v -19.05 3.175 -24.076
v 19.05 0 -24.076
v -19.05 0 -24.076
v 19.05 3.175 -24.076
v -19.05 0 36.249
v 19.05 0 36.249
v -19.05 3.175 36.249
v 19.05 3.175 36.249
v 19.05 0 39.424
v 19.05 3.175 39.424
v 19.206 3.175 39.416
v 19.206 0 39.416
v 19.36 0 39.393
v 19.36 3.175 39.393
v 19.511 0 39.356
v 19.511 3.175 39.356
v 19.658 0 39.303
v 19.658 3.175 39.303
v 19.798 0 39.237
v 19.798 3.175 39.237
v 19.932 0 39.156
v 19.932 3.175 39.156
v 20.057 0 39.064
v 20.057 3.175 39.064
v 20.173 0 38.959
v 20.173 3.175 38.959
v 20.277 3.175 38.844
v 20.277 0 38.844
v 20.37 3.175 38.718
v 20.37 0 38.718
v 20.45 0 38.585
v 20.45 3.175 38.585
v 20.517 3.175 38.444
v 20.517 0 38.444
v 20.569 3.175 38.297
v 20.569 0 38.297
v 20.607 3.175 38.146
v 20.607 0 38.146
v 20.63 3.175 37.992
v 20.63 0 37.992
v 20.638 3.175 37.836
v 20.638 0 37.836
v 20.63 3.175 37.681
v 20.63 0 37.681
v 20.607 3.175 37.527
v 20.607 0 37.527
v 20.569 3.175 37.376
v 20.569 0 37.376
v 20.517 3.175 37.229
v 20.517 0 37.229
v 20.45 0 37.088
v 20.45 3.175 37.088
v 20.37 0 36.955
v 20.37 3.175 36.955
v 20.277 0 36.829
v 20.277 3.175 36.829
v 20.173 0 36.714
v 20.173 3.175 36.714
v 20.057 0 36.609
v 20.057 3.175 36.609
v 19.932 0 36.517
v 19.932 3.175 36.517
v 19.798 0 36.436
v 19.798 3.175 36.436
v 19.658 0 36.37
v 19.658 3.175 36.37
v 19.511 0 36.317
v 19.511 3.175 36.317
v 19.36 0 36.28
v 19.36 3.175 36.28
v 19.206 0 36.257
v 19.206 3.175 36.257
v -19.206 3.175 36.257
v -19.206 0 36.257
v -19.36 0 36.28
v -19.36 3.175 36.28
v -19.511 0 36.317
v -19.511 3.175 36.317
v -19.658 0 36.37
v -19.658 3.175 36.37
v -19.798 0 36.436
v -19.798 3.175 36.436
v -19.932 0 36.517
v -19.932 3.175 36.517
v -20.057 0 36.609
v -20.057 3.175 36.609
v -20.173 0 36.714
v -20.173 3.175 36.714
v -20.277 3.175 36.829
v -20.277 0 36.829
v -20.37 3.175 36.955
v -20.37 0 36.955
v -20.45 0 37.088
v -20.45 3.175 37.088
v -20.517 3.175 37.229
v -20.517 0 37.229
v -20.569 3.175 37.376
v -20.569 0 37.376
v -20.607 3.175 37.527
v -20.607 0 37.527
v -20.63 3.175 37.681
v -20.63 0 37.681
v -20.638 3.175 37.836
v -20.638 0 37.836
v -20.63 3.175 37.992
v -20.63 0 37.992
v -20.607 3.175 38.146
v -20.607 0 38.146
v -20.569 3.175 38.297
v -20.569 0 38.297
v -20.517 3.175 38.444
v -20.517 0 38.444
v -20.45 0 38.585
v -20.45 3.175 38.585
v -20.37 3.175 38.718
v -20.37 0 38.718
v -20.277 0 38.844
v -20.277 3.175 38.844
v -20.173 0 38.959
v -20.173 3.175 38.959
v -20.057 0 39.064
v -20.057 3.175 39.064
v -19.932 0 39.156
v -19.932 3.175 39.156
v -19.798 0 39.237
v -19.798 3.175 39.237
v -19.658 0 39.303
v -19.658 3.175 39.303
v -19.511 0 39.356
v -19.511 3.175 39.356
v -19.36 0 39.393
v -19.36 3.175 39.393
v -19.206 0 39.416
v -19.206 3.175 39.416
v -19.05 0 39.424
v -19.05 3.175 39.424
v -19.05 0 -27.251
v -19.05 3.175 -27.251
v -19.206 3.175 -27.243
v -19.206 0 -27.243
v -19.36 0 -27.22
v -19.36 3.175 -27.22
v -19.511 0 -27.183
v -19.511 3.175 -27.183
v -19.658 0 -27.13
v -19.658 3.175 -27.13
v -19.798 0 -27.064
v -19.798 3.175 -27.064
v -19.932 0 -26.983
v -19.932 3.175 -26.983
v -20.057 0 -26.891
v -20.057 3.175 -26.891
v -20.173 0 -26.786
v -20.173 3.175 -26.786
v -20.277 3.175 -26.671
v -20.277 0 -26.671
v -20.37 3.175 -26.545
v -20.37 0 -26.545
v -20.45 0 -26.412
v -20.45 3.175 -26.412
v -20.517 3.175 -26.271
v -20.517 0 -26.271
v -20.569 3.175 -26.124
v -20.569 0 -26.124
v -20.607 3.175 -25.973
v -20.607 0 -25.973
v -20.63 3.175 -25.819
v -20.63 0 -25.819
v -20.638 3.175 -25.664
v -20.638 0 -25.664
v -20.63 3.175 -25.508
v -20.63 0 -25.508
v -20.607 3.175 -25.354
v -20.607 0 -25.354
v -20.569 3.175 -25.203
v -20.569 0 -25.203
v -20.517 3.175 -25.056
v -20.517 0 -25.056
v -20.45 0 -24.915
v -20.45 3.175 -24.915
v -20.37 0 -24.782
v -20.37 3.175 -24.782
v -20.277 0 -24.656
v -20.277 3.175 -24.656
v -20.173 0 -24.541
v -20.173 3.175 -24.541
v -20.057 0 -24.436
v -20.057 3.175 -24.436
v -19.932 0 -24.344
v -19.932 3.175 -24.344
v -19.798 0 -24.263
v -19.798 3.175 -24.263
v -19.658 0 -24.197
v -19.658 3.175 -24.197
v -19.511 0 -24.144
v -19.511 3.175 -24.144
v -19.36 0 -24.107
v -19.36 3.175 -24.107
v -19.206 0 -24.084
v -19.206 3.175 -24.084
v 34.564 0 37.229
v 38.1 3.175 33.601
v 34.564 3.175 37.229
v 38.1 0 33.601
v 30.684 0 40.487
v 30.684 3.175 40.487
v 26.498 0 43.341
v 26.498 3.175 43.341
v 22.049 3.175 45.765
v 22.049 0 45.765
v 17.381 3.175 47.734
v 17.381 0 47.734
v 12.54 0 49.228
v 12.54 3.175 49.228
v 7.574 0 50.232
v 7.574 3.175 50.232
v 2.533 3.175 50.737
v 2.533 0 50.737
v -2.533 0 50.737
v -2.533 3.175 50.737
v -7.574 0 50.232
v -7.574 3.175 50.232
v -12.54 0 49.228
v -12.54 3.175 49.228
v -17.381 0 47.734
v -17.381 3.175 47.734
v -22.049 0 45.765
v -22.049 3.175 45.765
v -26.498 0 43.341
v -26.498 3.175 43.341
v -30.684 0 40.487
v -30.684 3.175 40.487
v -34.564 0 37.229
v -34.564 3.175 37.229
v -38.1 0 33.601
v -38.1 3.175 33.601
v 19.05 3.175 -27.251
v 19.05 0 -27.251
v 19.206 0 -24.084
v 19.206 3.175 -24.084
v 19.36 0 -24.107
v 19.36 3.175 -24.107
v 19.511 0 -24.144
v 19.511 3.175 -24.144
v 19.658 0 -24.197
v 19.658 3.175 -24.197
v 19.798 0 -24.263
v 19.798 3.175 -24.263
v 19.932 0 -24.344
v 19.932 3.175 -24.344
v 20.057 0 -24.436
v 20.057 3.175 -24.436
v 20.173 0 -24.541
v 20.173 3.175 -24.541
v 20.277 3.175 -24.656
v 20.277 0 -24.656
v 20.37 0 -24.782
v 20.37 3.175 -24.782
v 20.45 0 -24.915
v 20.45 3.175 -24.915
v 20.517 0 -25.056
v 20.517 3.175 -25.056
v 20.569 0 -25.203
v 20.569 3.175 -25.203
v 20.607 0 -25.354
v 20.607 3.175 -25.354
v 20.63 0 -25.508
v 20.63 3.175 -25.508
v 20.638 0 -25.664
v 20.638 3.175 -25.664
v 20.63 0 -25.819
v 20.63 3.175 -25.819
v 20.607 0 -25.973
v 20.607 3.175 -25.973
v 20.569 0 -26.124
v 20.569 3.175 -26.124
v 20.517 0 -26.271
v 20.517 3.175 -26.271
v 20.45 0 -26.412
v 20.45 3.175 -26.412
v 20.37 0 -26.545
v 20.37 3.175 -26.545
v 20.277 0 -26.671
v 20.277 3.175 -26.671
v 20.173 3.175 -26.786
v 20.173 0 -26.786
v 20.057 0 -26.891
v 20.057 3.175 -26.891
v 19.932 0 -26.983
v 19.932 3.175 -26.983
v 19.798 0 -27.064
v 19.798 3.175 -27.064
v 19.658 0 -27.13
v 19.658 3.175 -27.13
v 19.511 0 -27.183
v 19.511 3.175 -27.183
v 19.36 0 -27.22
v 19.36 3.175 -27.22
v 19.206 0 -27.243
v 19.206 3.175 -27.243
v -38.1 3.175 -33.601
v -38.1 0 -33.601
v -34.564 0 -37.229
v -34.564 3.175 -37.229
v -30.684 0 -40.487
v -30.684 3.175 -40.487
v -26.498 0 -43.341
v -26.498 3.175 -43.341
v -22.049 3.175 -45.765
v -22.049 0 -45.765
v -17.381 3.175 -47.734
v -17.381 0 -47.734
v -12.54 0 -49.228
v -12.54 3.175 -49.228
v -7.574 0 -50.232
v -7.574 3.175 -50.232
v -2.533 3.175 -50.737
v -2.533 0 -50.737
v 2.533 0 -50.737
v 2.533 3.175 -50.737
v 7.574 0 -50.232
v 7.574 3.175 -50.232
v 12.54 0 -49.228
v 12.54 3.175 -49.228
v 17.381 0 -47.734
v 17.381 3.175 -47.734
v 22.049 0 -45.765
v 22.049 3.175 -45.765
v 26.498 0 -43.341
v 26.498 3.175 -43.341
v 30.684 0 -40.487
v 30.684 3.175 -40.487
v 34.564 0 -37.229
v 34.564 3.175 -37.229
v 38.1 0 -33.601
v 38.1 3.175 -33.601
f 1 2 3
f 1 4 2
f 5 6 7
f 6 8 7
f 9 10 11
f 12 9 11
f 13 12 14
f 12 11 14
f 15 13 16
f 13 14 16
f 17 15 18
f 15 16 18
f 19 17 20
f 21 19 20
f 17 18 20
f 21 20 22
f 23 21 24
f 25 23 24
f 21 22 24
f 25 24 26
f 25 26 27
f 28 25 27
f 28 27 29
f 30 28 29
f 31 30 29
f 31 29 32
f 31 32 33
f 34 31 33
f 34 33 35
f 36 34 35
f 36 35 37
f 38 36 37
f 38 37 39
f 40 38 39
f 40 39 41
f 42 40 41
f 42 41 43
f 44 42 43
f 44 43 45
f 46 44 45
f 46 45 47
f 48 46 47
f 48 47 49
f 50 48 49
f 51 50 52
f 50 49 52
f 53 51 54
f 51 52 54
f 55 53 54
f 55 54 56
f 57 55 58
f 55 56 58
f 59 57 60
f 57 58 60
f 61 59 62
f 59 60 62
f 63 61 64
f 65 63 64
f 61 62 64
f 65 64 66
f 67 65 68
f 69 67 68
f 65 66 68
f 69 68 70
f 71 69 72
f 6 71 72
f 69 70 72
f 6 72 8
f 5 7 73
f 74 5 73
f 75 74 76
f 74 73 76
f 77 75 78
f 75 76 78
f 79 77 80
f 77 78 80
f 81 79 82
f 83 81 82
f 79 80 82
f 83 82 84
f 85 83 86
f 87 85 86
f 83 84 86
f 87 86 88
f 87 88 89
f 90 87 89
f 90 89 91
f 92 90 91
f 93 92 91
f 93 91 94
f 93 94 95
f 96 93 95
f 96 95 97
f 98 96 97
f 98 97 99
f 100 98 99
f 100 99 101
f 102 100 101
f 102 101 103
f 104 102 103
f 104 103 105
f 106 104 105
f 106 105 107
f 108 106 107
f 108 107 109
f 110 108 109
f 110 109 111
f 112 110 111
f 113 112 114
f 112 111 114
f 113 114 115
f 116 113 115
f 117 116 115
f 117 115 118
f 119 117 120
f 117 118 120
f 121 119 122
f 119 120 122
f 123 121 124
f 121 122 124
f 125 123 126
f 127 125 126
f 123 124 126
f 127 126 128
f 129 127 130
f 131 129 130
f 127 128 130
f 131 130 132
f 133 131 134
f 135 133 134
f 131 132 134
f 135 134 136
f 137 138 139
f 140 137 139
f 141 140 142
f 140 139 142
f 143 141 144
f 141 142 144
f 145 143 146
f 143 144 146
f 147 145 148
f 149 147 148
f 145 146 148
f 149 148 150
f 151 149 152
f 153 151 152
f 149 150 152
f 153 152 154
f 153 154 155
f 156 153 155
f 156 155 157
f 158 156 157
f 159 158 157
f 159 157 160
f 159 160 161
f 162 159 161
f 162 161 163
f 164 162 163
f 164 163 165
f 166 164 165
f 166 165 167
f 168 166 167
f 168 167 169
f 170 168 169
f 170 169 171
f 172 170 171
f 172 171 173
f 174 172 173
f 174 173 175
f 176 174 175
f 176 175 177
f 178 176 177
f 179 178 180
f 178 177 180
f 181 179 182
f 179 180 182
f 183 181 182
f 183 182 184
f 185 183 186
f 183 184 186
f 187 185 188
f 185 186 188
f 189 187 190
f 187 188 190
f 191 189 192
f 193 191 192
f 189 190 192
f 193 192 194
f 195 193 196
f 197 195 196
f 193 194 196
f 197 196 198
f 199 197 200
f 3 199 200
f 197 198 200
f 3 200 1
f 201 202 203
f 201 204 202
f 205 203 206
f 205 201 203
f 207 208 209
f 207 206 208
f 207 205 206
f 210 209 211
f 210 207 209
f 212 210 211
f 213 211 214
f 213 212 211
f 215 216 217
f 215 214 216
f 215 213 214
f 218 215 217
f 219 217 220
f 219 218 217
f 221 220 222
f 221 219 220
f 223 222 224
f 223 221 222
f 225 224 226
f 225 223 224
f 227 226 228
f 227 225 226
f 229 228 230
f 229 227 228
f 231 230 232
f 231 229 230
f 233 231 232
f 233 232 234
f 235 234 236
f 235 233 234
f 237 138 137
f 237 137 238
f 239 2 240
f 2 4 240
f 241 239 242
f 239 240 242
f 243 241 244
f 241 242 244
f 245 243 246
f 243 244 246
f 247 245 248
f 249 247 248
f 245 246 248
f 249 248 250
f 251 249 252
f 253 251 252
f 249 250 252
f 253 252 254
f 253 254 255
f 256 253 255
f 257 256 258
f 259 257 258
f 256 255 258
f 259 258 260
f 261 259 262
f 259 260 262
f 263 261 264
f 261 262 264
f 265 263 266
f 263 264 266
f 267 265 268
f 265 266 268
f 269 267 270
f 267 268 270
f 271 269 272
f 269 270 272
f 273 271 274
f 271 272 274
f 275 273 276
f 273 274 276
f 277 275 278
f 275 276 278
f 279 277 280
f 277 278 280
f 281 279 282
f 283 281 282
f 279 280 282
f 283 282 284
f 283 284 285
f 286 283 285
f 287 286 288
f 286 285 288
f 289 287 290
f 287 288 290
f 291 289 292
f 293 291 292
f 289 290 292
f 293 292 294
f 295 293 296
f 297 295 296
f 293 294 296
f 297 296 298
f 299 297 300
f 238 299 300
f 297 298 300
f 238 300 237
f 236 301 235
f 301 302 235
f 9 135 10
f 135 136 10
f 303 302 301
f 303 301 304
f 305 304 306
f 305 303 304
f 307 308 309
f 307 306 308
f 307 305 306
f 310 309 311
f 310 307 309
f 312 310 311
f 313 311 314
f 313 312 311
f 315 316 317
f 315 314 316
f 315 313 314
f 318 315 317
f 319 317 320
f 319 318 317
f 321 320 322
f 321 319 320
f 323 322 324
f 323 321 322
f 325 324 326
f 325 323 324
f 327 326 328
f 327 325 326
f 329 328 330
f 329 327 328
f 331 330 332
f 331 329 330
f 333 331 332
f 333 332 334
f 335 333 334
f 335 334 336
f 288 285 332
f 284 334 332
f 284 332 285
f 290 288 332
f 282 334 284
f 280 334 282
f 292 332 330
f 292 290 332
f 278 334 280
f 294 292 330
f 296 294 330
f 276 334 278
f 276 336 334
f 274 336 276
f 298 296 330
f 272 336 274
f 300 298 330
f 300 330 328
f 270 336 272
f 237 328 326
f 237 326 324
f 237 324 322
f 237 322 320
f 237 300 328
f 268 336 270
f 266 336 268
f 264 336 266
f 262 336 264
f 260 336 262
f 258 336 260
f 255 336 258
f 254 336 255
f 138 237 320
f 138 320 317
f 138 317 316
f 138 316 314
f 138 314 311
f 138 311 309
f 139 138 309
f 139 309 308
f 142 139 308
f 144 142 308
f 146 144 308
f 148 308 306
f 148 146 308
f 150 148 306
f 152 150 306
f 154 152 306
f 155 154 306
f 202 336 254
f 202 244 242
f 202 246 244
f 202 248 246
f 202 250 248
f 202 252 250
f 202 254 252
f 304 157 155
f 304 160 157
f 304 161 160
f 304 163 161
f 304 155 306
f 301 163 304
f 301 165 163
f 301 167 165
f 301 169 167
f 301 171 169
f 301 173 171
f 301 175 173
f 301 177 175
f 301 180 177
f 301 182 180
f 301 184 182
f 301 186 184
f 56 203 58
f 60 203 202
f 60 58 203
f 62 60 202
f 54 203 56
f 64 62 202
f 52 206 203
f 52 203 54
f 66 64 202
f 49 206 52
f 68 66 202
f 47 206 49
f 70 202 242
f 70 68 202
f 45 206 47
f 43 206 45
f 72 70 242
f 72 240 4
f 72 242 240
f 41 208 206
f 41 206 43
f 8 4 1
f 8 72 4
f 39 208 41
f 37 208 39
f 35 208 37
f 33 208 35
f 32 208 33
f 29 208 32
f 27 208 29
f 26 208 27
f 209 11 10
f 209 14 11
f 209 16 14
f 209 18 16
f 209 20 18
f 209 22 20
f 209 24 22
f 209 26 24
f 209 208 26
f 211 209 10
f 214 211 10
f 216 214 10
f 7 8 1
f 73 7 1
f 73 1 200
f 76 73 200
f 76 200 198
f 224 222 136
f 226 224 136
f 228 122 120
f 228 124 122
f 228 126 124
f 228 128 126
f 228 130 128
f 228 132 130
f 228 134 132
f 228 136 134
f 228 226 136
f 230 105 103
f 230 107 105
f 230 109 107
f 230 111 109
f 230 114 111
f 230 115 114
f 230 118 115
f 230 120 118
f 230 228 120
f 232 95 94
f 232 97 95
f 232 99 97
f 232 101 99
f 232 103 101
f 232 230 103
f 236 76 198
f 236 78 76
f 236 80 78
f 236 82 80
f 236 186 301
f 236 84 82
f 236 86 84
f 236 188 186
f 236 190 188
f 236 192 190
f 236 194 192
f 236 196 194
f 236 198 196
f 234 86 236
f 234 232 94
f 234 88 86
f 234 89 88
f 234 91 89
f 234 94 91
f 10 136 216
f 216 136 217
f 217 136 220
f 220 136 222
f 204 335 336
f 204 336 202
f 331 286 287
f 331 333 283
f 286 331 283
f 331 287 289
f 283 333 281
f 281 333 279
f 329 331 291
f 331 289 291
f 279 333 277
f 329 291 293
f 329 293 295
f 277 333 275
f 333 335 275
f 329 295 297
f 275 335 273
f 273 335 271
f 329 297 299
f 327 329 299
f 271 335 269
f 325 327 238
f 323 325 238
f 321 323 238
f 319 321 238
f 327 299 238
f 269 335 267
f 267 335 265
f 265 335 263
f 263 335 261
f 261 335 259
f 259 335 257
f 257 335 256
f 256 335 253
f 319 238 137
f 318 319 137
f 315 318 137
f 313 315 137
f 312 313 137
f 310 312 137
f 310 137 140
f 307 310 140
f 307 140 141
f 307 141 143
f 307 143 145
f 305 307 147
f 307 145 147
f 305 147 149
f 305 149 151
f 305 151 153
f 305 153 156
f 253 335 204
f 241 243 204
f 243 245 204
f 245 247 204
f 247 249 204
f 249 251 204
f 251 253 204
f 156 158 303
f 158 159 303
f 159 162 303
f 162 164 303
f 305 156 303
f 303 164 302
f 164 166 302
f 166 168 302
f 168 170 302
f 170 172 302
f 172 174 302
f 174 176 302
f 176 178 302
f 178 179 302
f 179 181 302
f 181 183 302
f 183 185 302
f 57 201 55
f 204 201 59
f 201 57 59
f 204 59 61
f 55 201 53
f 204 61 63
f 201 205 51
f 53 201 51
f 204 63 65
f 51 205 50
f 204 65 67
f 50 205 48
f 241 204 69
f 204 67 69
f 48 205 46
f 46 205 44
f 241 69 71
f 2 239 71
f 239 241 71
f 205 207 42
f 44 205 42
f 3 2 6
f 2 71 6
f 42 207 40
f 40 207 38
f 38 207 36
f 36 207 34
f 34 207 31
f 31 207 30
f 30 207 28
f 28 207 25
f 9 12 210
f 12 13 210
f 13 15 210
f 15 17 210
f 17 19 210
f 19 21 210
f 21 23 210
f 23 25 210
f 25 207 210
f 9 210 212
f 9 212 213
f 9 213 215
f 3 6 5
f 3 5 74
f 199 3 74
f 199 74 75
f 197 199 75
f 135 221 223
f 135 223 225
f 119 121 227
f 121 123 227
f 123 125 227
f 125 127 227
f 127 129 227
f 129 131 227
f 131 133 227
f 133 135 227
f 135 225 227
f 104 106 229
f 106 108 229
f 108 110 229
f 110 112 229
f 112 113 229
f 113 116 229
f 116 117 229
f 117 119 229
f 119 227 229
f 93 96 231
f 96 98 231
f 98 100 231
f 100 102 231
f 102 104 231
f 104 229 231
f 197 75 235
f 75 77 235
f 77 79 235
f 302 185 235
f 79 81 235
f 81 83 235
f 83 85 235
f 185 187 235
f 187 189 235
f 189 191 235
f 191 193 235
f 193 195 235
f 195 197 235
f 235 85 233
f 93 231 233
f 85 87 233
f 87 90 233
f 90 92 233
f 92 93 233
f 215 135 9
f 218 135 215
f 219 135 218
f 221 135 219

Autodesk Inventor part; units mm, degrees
ref_plane "YZ Plane" through (0, 0, 0) normal (1, 0, 0) x (0, 1, 0)
ref_plane "XZ Plane" through (0, 0, 0) normal (0, 1, 0) x (-1, 0, 0)
ref_plane "XY Plane" through (0, 0, 0) normal (0, 0, 1) x (1, 0, 0)
sketch "Sketch1" plane through (0, 0, 0) normal (0, 1, 0) x (-1, 0, 0)
  arc A0 (38.1, 33.601) -> (-38.1, 33.601) centre (0, 0) ccw
  line L0 (38.1, -33.601) -> (38.1, 33.601)
  arc A1 (38.1, -33.601) -> (38.1, 33.601) centre (0, 0) ccw construction
  line L1 (-38.1, -33.601) -> (-38.1, 33.601)
  arc A2 (-38.1, -33.601) -> (38.1, -33.601) centre (0, 0) ccw
  arc A3 (-38.1, 33.601) -> (-38.1, -33.601) centre (0, 0) ccw construction
  dimension "d0" = 101.6
  dimension "d3" = 12.7
  dimension "d4" = 76.2
extrude "Extrusion1" add sketch "Sketch1" along normal blind 3.175
sketch "Sketch2" plane through (0, 3.175, 0) normal (0, 1, 0) x (1, 0, 0)
  line L0 (-38.1, 33.601) -> (38.1, 33.601) construction
  line L1 (38.1, -33.601) -> (-38.1, -33.601) construction
  line L2 (-38.1, -6.0865) -> (38.1, -6.0865) construction
  line L3 (38.1, 33.601) -> (38.1, -33.601) construction
  line L4 (38.1, -33.601) -> (38.1, 33.601) construction
  line L5 (-19.05, 27.251) -> (19.05, 27.251)
  line L6 (19.05, 24.076) -> (-19.05, 24.076)
  arc A0 (-19.05, 27.251) -> (-19.05, 24.076) centre (-19.05, 25.6635) ccw
  arc A1 (19.05, 24.076) -> (19.05, 27.251) centre (19.05, 25.6635) ccw
  line L7 (-38.1, 33.601) -> (-38.1, -33.601) projected
  line L8 (-19.05, -39.424) -> (19.05, -39.424)
  line L9 (19.05, -36.249) -> (-19.05, -36.249)
  arc A2 (-19.05, -36.249) -> (-19.05, -39.424) centre (-19.05, -37.8365) ccw
  arc A3 (19.05, -39.424) -> (19.05, -36.249) centre (19.05, -37.8365) ccw
  point P0 (0, 0)
  dimension "d11" = 19.05
  dimension "d12" = 19.05
  dimension "d13" = 6.35
  dimension "d14" = 3.175
  dimension "d17" = 63.5
extrude "Extrusion2" cut sketch "Sketch2" against normal through all
properties part number "top"
